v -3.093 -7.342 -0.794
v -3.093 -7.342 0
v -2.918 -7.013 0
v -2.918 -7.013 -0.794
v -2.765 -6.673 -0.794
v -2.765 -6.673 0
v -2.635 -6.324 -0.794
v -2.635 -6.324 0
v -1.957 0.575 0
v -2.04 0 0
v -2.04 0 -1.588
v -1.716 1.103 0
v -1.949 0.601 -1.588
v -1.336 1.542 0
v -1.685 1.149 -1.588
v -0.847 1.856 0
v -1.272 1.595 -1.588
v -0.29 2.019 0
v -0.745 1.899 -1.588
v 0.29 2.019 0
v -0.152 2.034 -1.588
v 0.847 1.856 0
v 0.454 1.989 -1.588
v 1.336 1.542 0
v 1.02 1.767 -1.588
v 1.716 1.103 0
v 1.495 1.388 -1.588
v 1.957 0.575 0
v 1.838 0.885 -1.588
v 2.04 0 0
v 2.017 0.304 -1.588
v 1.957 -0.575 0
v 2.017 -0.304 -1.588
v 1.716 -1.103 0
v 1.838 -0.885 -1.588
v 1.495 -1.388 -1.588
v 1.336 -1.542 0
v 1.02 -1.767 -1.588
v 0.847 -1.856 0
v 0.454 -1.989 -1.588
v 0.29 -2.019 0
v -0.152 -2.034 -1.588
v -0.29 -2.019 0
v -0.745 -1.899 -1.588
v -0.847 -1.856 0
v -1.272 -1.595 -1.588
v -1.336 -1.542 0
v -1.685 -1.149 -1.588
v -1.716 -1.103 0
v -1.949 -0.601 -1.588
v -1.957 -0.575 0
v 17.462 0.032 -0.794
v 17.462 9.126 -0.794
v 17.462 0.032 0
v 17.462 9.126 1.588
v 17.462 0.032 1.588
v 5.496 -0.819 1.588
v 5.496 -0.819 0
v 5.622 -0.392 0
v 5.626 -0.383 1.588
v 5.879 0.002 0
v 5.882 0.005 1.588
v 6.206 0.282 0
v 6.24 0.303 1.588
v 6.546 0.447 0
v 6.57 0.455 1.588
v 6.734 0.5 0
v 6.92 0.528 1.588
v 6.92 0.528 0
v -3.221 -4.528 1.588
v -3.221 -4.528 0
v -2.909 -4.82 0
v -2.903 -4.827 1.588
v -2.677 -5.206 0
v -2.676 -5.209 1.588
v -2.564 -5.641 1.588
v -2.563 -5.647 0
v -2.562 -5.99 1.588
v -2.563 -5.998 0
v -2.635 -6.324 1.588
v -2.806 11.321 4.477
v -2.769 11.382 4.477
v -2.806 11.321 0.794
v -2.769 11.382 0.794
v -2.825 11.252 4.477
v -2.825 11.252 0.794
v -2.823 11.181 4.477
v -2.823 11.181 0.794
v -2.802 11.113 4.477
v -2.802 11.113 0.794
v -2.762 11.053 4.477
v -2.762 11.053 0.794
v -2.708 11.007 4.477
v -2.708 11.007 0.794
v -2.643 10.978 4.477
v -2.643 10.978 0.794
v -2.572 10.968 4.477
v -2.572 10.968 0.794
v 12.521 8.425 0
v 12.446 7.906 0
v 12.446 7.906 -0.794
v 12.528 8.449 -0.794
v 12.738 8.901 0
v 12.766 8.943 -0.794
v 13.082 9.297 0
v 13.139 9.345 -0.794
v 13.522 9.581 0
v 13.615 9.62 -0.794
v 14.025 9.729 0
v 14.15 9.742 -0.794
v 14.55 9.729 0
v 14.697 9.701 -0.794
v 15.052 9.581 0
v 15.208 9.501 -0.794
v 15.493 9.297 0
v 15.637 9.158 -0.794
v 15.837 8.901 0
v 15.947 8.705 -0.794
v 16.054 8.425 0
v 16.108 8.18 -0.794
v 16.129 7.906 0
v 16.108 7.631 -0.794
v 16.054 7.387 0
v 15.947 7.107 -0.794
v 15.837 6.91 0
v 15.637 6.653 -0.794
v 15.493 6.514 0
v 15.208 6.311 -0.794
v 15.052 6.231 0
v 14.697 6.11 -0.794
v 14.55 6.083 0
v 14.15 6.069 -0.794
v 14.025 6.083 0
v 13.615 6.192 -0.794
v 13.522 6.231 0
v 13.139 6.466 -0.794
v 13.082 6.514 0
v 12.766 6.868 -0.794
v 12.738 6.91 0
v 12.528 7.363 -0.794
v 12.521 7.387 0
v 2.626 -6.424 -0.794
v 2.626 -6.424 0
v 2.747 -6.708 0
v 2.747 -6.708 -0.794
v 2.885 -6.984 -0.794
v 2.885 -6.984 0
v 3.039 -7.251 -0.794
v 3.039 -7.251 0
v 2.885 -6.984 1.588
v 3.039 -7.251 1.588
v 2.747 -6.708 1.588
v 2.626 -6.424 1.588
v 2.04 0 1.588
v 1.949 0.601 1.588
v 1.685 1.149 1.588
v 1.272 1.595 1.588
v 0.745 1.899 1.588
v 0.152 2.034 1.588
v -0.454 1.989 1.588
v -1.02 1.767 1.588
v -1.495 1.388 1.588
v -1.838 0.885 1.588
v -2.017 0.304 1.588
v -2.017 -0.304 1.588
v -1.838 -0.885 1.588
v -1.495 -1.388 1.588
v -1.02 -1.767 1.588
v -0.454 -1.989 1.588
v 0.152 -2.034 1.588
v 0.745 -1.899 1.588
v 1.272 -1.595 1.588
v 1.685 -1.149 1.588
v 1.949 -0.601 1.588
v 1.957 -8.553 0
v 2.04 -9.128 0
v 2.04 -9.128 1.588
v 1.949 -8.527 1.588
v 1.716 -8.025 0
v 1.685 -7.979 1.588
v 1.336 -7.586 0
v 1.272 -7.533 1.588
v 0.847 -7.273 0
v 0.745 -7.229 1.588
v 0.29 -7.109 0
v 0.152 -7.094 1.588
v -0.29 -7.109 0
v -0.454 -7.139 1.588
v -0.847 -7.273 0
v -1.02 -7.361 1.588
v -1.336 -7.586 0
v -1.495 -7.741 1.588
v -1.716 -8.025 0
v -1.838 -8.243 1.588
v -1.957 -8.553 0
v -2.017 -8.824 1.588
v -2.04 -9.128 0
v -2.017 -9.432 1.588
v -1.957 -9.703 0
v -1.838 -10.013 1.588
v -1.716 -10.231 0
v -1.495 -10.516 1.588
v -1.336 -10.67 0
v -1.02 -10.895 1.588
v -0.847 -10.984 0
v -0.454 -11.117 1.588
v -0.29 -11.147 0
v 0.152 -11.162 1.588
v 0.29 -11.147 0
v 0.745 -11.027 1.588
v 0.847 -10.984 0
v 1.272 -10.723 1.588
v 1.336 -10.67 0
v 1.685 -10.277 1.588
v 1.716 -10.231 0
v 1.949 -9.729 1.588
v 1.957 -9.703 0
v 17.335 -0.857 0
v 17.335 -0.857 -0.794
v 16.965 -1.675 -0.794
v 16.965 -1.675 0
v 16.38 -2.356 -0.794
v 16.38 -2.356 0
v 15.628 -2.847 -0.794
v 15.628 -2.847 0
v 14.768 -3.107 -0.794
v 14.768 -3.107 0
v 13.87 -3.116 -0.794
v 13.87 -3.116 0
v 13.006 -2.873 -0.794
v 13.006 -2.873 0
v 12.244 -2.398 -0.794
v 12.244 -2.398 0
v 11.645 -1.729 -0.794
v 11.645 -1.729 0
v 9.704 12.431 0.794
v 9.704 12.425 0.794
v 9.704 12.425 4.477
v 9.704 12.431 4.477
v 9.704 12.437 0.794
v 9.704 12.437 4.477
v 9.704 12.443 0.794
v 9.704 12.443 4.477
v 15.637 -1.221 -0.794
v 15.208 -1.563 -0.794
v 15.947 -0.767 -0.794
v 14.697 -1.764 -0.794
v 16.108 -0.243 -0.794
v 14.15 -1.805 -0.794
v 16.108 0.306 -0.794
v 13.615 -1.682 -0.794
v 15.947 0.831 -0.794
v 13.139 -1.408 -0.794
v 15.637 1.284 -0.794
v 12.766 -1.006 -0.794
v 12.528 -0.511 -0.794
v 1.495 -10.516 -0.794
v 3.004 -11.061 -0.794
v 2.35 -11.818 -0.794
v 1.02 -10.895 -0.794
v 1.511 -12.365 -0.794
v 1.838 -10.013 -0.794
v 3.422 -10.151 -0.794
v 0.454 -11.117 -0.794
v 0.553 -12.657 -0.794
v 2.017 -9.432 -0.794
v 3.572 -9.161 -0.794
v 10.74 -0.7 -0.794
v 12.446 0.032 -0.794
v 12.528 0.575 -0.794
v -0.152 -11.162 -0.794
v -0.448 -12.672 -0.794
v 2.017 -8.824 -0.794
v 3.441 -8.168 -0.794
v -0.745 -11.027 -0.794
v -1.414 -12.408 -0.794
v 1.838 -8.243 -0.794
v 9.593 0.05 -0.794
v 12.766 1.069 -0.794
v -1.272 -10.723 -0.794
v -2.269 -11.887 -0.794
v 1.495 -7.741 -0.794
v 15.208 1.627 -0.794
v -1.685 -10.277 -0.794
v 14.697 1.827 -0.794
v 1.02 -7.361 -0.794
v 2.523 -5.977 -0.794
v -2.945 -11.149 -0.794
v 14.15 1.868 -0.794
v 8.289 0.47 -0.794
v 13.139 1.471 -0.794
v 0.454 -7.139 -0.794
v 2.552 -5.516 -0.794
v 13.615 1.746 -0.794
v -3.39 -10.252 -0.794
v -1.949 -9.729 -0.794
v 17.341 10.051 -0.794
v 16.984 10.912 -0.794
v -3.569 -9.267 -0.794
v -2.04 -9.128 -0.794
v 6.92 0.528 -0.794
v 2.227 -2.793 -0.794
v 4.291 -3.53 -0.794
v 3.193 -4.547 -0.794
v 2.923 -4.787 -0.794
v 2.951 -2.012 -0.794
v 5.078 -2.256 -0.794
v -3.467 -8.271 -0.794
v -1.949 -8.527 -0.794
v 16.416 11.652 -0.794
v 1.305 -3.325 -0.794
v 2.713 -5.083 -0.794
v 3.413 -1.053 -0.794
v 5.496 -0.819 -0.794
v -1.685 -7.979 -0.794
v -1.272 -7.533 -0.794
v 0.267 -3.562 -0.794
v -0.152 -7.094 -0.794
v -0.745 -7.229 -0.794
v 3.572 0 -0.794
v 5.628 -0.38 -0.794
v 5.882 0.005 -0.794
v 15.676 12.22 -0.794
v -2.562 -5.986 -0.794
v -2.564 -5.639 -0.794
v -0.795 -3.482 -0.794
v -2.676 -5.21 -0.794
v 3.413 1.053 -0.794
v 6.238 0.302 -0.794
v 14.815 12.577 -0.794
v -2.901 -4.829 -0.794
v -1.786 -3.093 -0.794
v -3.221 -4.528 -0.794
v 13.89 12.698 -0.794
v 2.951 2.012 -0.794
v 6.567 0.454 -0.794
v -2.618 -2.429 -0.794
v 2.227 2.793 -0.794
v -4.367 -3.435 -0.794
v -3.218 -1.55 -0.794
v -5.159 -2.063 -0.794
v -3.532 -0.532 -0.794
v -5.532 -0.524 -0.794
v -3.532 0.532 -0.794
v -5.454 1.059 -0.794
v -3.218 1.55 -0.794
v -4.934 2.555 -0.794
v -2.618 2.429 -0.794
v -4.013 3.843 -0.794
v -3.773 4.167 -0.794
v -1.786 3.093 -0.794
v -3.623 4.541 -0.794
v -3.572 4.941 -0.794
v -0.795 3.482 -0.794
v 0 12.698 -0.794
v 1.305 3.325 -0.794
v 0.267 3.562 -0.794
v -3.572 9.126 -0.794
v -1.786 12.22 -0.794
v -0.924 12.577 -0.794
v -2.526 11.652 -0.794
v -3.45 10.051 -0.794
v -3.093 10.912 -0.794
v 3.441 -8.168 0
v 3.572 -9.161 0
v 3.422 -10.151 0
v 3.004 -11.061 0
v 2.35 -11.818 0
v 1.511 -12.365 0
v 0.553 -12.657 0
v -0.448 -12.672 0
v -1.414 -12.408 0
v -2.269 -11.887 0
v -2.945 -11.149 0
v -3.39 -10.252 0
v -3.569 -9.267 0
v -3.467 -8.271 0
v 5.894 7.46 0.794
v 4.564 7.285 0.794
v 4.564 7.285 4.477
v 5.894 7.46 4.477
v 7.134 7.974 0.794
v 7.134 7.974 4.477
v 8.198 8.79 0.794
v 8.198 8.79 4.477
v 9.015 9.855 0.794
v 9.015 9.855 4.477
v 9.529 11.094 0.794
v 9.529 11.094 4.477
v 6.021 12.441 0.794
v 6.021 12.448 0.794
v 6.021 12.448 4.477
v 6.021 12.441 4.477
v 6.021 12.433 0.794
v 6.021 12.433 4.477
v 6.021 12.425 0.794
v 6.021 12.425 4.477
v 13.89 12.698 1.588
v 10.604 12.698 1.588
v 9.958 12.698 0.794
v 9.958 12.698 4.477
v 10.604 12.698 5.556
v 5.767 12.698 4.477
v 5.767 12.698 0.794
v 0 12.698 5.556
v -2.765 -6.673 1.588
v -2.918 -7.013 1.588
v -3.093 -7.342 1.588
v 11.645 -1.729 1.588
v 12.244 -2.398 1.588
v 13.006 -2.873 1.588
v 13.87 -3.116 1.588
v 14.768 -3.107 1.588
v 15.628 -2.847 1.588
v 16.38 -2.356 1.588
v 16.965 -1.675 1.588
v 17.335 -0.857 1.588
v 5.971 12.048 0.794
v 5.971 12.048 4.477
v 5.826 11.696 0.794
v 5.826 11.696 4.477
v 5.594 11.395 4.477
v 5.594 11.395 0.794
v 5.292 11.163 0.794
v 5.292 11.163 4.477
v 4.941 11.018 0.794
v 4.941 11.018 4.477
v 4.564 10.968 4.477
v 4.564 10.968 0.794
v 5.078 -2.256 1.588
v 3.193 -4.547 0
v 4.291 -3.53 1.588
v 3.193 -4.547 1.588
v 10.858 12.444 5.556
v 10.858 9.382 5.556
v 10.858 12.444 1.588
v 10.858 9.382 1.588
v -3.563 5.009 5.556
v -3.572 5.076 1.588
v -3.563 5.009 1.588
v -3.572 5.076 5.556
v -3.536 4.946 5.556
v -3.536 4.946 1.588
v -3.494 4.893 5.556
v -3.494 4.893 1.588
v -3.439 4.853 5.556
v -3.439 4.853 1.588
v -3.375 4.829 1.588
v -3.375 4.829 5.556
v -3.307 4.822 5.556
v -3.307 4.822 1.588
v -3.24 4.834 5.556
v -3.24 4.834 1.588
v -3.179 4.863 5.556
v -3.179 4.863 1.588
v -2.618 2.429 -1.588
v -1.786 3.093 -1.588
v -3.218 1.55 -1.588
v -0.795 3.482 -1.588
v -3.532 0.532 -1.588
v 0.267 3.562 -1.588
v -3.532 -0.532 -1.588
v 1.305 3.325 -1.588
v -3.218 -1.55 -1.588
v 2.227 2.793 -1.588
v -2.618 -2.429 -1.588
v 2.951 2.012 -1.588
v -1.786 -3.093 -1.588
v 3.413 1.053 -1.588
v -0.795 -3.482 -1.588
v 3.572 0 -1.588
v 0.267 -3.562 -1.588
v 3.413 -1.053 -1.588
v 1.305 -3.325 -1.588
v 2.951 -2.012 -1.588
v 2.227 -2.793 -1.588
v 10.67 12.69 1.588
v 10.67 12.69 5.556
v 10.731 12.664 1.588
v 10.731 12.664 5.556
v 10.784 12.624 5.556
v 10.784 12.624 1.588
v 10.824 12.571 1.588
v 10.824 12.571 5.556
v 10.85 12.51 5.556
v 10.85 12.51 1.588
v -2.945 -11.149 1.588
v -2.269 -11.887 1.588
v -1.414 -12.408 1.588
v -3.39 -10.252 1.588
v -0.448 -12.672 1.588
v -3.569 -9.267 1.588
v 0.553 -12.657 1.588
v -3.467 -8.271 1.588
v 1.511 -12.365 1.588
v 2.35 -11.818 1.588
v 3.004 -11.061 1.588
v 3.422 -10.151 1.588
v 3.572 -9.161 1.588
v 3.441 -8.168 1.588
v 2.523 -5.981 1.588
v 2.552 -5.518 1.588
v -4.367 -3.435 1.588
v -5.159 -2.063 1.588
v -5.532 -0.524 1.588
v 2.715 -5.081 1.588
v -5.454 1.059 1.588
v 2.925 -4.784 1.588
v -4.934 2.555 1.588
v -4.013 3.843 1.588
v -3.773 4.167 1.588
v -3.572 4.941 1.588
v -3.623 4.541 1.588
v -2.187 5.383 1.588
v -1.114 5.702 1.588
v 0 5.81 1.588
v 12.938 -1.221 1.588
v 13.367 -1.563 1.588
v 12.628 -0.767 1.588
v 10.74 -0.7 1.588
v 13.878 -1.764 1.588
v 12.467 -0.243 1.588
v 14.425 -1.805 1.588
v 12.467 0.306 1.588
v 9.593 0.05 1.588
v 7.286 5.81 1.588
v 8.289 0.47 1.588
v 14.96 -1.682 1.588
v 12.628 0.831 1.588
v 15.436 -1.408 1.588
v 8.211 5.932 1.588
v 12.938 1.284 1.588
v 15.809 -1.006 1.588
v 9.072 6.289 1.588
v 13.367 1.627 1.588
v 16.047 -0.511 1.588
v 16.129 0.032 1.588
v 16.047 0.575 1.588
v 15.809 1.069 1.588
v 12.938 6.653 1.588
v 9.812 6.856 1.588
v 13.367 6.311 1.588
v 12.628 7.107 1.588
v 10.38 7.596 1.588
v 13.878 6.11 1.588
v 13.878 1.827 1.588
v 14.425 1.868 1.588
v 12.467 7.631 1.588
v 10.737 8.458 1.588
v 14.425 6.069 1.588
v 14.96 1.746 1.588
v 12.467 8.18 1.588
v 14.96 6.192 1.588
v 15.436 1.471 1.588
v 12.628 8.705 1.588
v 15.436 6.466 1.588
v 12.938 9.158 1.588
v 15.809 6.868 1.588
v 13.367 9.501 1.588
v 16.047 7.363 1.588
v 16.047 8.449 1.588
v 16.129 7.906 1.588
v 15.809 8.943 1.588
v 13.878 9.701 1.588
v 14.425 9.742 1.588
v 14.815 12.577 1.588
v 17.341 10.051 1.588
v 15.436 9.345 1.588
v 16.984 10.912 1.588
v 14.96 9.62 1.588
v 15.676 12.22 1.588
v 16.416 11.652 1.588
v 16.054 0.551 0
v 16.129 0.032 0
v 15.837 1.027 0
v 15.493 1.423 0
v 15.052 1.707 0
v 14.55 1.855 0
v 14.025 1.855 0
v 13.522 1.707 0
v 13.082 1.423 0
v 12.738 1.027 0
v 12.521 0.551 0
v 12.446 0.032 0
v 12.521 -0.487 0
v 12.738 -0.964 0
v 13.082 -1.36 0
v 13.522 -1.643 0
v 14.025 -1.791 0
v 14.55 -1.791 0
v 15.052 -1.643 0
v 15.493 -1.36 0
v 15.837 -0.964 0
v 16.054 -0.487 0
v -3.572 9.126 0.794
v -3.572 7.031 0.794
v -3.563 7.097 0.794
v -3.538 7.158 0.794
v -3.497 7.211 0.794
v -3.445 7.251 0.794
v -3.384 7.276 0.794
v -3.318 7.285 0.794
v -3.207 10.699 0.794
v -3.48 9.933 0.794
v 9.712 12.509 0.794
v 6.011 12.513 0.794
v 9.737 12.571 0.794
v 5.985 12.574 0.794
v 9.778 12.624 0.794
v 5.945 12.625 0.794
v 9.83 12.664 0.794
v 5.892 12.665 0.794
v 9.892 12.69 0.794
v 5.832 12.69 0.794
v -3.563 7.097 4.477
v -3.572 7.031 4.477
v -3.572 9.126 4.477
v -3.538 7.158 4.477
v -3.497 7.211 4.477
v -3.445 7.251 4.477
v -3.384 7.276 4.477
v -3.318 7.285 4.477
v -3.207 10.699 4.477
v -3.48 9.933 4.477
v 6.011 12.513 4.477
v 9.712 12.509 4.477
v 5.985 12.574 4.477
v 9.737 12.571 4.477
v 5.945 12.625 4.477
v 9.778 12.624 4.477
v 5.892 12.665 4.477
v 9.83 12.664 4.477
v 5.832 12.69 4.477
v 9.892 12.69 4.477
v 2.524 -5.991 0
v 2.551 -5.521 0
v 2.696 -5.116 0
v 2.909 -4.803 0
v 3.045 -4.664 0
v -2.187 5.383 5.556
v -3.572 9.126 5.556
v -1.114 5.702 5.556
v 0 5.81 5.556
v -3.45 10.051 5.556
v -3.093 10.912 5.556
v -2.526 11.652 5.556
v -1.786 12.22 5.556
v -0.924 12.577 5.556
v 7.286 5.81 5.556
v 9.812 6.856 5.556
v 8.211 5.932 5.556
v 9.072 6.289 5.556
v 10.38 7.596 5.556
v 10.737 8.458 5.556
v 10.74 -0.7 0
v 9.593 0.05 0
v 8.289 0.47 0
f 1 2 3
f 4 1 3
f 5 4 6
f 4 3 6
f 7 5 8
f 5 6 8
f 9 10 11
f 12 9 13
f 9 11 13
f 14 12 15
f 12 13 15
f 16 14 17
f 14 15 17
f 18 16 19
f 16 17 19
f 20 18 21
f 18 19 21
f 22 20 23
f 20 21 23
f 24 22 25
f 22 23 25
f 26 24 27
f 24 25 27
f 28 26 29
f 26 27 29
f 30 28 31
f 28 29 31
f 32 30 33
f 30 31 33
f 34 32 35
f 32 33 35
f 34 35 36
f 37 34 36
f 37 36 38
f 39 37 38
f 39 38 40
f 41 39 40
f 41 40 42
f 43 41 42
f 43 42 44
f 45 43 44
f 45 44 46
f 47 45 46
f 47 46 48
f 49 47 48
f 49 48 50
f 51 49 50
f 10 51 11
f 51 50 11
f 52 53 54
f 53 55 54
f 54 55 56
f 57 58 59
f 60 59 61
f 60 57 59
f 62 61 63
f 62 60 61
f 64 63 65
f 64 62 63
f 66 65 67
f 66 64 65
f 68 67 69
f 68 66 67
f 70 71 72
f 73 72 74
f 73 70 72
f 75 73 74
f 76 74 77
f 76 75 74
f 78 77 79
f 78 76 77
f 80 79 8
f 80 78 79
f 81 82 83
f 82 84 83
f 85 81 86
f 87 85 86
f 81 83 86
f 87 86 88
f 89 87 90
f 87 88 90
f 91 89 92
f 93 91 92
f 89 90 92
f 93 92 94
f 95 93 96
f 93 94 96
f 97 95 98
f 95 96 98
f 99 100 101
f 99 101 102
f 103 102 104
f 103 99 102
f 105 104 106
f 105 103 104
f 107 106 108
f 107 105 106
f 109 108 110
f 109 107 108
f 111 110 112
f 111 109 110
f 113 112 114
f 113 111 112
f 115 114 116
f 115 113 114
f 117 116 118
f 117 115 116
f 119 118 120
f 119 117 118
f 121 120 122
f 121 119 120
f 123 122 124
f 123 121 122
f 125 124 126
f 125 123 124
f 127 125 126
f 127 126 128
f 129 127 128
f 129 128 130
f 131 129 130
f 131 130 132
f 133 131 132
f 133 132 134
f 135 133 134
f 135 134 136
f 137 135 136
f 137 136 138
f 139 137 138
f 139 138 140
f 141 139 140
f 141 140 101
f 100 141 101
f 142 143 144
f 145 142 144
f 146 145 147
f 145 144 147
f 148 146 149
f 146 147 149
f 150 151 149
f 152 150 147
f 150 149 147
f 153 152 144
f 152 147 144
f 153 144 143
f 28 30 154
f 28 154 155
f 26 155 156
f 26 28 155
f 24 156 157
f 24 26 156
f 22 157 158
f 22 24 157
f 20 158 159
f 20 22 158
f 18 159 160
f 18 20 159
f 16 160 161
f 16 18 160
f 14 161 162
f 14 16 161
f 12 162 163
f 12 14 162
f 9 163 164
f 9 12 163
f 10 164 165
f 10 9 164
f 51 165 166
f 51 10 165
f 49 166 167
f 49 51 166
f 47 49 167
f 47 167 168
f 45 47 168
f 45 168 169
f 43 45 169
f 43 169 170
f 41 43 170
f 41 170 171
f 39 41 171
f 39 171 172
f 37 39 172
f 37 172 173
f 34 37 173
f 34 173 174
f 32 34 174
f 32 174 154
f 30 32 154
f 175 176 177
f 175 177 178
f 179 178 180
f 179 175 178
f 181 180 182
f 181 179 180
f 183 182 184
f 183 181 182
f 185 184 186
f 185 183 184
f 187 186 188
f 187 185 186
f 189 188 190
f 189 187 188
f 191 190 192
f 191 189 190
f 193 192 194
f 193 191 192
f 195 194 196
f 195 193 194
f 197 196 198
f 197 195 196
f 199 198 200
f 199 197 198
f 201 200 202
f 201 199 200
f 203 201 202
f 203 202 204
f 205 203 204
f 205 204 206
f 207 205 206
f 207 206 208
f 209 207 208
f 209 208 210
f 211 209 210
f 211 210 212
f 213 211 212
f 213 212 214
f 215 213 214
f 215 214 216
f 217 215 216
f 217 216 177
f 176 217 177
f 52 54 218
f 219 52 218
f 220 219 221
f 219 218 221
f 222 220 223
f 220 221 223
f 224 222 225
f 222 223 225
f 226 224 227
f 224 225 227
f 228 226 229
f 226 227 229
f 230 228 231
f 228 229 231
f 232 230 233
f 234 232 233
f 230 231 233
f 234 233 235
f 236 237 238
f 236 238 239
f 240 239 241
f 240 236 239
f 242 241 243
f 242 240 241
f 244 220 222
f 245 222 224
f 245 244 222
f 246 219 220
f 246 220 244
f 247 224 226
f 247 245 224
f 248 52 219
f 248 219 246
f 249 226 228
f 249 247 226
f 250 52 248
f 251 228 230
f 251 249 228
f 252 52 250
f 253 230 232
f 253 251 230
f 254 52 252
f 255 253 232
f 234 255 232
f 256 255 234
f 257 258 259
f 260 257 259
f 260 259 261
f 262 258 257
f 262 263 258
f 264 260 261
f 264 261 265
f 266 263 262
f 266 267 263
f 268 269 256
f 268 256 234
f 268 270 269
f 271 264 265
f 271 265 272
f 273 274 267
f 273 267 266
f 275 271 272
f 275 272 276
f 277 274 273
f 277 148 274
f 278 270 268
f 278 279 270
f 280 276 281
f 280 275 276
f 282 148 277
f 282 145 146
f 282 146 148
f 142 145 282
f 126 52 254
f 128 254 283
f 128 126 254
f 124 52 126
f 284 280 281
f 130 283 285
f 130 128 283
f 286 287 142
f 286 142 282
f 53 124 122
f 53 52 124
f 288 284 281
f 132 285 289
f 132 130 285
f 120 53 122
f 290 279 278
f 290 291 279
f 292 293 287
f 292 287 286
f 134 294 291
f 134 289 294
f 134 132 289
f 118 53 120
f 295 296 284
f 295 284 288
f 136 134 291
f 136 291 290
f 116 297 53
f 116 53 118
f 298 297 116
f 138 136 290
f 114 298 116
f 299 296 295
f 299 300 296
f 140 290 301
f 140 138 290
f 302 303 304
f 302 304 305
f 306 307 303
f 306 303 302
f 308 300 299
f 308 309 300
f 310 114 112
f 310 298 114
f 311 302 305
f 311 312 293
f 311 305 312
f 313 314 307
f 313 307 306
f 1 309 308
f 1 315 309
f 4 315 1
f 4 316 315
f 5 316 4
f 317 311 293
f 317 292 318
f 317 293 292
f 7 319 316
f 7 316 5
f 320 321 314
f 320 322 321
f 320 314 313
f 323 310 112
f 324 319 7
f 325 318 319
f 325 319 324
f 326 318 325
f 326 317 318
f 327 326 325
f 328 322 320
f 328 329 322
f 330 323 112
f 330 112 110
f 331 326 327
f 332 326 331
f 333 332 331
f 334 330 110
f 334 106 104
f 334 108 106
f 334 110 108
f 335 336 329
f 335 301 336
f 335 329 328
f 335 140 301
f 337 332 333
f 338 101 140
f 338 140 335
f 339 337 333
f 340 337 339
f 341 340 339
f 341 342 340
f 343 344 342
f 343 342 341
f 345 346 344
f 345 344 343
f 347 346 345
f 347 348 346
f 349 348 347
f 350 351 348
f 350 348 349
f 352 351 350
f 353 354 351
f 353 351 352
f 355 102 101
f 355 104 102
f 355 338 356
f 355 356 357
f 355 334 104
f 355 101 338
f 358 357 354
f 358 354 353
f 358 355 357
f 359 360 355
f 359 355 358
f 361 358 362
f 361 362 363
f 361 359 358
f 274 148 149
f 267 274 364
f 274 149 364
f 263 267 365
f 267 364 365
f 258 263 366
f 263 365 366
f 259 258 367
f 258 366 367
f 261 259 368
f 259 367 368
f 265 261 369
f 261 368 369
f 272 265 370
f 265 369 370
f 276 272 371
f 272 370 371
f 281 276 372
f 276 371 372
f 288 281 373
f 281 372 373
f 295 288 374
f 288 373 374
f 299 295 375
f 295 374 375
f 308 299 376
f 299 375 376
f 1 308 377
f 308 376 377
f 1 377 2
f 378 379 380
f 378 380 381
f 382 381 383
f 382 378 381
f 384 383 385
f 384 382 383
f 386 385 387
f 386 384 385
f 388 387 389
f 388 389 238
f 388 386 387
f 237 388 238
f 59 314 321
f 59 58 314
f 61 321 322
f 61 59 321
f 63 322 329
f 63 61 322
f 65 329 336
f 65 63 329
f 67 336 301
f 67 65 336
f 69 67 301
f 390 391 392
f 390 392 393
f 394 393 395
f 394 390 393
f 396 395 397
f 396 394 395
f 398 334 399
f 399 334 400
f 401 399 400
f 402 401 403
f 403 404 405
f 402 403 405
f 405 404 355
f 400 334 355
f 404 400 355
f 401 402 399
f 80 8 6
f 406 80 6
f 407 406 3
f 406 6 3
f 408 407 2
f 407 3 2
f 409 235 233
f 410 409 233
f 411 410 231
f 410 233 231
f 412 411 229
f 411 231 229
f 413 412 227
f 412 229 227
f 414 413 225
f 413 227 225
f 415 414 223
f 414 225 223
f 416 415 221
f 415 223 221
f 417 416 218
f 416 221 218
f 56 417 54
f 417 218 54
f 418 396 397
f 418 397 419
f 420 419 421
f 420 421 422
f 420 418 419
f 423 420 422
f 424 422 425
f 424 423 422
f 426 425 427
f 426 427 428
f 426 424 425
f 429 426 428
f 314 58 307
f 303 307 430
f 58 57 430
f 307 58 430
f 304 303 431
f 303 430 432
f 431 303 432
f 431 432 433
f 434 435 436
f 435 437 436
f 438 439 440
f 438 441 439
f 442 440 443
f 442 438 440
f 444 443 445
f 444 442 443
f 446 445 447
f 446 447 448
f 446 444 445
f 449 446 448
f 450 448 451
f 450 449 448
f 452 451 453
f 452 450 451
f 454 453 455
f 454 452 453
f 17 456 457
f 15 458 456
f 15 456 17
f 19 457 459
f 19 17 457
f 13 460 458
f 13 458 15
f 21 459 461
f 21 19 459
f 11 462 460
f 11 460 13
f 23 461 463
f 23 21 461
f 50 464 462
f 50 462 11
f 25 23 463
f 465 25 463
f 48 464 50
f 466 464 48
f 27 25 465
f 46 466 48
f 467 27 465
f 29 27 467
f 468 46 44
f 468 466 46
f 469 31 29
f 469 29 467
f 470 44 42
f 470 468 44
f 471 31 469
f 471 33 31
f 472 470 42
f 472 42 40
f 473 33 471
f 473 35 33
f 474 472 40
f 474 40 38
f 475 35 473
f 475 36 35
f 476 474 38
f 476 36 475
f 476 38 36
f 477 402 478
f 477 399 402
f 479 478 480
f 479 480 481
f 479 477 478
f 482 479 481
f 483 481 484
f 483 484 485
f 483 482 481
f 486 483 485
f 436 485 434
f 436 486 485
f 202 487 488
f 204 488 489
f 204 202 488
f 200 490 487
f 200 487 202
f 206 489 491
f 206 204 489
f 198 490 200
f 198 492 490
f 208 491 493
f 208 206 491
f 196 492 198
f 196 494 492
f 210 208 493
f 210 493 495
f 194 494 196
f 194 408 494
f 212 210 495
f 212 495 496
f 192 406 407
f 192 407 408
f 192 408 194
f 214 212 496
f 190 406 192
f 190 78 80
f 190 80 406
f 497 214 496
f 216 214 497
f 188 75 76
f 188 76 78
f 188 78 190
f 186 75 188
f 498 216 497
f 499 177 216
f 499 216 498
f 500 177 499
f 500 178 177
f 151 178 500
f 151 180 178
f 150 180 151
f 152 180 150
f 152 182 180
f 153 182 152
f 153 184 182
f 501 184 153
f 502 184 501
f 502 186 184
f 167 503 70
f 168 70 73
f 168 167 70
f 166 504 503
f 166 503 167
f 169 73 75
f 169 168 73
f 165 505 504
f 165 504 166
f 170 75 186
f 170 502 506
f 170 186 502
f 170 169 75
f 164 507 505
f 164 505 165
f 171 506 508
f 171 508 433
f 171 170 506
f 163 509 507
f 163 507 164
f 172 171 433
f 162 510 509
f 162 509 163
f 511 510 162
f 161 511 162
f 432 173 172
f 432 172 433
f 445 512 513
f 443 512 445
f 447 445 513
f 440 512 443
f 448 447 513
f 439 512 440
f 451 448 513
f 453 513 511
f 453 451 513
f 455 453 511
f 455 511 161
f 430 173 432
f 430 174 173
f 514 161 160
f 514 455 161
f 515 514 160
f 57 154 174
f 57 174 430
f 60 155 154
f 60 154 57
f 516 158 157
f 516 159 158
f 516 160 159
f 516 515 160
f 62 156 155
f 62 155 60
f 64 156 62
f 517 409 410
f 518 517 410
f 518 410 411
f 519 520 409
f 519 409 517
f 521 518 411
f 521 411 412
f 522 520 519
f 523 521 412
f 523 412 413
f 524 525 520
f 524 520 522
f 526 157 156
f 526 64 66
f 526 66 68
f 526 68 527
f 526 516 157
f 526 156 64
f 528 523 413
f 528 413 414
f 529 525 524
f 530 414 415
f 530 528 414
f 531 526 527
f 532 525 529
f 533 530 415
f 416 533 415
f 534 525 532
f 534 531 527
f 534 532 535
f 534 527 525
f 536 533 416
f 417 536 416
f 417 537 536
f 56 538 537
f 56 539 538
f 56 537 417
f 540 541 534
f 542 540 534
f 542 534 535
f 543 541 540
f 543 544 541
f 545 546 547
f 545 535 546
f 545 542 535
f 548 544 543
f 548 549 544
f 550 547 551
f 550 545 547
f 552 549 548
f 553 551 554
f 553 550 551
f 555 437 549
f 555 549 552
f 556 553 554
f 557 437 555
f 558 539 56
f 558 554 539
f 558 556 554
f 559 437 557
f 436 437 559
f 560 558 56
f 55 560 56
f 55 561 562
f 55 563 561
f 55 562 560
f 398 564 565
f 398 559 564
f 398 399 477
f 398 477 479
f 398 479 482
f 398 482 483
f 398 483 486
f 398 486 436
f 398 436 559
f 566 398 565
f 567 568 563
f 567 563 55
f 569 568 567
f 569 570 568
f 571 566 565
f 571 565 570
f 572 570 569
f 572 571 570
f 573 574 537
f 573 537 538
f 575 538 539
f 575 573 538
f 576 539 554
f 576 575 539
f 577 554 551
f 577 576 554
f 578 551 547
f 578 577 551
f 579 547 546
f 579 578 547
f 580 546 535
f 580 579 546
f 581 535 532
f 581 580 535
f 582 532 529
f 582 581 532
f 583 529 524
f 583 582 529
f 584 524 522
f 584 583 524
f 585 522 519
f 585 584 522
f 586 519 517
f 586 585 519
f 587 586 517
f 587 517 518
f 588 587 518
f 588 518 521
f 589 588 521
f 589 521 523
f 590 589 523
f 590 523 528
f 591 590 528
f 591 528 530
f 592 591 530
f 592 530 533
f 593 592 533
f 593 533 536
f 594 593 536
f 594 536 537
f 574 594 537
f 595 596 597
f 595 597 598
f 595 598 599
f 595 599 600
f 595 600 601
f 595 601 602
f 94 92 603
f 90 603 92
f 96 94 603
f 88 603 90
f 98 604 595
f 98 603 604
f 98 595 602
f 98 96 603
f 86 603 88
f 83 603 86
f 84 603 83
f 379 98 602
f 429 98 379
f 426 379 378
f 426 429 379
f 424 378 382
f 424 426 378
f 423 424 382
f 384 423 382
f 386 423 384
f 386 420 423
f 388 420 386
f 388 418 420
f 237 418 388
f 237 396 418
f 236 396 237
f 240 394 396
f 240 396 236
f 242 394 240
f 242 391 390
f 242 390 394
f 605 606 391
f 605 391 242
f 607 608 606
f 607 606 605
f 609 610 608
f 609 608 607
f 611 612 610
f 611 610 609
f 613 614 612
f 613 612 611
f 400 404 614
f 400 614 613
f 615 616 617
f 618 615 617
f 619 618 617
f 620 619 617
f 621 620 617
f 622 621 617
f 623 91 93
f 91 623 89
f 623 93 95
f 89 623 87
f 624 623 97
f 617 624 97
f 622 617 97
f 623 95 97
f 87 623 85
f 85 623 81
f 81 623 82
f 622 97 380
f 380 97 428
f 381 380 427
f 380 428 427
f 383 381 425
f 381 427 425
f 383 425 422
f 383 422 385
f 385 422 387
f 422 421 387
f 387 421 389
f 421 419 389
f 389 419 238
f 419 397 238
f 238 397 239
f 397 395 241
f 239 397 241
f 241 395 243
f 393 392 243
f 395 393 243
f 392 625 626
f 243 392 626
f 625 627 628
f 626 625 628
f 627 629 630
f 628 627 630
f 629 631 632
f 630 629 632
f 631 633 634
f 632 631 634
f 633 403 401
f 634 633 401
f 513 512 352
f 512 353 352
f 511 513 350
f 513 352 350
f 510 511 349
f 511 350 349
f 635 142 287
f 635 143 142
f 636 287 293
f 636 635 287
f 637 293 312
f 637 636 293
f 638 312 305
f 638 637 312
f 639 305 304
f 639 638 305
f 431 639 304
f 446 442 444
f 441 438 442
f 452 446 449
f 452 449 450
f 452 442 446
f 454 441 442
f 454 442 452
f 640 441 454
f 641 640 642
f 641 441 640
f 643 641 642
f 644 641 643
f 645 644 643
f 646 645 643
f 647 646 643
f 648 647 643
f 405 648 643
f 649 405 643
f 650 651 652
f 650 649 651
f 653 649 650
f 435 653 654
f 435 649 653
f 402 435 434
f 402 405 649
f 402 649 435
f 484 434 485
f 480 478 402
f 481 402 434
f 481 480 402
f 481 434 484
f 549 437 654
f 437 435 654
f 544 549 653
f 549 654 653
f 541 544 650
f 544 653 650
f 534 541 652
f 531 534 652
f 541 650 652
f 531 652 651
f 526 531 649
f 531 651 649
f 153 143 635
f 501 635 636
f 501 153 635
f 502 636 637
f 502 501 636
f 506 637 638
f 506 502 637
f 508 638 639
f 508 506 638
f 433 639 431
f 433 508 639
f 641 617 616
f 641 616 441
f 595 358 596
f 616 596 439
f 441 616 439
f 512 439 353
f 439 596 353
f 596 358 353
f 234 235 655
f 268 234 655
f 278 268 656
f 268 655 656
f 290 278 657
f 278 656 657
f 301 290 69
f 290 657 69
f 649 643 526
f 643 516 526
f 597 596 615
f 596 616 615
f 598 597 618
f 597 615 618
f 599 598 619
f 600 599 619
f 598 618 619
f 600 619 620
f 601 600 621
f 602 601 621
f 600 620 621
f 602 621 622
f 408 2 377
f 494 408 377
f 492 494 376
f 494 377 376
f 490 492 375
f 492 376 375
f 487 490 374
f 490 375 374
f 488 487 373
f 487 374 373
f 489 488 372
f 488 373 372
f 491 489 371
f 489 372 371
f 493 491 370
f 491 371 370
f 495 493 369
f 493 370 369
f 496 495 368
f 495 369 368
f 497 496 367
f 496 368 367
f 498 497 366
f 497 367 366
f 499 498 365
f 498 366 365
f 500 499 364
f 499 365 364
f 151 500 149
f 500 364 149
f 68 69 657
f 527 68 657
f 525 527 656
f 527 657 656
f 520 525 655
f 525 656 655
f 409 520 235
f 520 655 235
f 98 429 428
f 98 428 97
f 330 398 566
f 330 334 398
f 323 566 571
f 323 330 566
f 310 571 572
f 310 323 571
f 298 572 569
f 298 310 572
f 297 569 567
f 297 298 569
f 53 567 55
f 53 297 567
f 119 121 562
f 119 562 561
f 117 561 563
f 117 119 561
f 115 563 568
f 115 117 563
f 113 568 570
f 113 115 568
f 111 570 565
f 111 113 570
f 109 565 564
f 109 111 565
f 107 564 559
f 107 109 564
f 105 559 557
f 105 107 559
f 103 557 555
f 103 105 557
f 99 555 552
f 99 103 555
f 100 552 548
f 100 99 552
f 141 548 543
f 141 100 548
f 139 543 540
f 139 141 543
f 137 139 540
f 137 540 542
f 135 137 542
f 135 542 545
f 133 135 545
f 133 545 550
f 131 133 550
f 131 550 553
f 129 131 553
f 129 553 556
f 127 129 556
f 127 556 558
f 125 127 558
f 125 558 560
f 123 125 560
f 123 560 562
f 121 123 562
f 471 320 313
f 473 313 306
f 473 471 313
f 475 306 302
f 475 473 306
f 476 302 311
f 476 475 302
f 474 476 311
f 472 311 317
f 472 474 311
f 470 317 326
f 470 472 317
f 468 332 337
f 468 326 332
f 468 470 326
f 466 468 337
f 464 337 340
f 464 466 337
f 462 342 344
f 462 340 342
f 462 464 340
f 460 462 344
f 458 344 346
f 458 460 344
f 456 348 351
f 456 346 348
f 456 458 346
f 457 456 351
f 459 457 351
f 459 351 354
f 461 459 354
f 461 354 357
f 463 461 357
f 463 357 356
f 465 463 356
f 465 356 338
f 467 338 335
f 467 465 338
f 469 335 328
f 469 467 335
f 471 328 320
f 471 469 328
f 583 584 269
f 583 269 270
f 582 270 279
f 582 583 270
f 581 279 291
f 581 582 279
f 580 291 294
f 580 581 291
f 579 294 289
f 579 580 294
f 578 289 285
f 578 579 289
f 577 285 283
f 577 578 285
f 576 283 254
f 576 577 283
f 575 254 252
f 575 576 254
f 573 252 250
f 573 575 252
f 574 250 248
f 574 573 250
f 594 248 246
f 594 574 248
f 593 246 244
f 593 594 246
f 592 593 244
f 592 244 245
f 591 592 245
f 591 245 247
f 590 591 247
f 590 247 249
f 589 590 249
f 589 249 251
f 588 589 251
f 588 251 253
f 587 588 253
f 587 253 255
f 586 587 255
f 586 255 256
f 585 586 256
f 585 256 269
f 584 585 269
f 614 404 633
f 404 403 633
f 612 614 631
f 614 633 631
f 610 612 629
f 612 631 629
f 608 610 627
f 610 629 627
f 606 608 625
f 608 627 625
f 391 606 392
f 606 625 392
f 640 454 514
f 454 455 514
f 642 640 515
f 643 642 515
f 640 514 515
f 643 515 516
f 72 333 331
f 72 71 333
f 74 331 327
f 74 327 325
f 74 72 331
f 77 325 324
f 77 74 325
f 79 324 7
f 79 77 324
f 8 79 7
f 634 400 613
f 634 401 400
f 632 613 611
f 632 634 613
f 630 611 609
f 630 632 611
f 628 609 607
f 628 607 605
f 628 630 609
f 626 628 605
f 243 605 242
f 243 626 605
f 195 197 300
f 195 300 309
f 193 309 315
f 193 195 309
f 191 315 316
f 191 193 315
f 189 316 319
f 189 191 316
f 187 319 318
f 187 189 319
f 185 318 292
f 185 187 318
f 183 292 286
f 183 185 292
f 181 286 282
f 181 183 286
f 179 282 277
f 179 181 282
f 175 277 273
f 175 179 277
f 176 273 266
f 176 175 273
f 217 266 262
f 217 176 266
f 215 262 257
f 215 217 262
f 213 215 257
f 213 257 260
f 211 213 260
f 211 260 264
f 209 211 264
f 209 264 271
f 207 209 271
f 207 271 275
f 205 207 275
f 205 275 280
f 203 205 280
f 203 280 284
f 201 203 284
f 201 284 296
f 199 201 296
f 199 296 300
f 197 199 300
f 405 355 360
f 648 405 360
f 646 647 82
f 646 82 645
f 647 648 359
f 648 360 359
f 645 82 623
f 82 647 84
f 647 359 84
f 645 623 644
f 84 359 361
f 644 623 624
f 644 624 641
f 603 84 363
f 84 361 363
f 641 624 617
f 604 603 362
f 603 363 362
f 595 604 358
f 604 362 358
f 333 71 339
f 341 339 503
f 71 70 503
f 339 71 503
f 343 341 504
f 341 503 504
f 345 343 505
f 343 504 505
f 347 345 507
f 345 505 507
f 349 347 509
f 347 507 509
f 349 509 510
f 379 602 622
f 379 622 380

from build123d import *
from build123d.topology import SkipClean

# Parameters (mm, degrees)
SKETCH2_R                 = 2.0399375
SKETCH2_R_2               = 1.8415
BOSS_EXTRUDE1_DEPTH       = 4.7625
CUT_EXTRUDE1_START        = -3.175
SKETCH5_R                 = 2.0399375
SKETCH5_R_2               = 1.8415
CUT_EXTRUDE1_DEPTH        = 3.175
CUT_EXTRUDE2_START        = 0.79375
CUT_EXTRUDE2_DEPTH        = 3.683
BOSS_EXTRUDE2_START       = 1.5875
SKETCH6_R                 = 3.571875
SKETCH6_R_2               = 2.0399375
BOSS_EXTRUDE2_DEPTH       = 1.5875
BOSS_EXTRUDE3_OUTLINE_R   = 2.0399375
BOSS_EXTRUDE3_OUTLINE_R_2 = 1.8415
BOSS_EXTRUDE3_OUTLINE_R_3 = 3.571875
BOSS_EXTRUDE3_DEPTH       = 0.79375
BOSS_EXTRUDE4_DEPTH       = 0.79375
FILLET1_R                 = 3.572002
FILLET2_R                 = 0.254
FILLET3_R                 = 1.5875


# Read off the part's stored shape, not the designer's step: Boss-Extrude3
with BuildPart() as part:
    # Sketch2 → Boss-Extrude1 (new body)
    with BuildSketch(Plane.XY):
        with BuildLine():
            Line((17.462464722, 12.698349), (0, 12.698349))
            ThreePointArc((0, 12.698349), (-2.525697034, 11.652171034), (-3.571875, 9.126474))
            Line((-3.571875, 9.126474), (-3.571875, 4.256010226))
            ThreePointArc((-3.571875, 4.256010226), (-5.510115516, -0.714521565), (-2.368197689, -5.02628628))
            ThreePointArc((-2.368197689, -5.02628628), (-2.602783662, -6.224309717), (-3.093334465, -7.342187459))
            ThreePointArc((-3.093334465, -7.342187459), (0.053006227, -12.699606675), (3.038971631, -7.251174697))
            ThreePointArc((3.038971631, -7.251174697), (2.543740299, -6.196888698), (2.299944817, -5.05788176))
            ThreePointArc((2.299944817, -5.05788176), (4.727286579, -2.919704723), (5.552352254, 0.208082946))
            ThreePointArc((5.552352254, 0.208082946), (8.938780729, 0.309264009), (11.645223776, -1.728701017))
            ThreePointArc((11.645223776, -1.728701017), (15.207114111, -3.007142891), (17.462464722, 0.03175))
            Line((17.462464722, 0.03175), (17.462464722, 12.698349))
        make_face()
        with Locations((0, -9.128125)):
            Circle(SKETCH2_R, mode=Mode.SUBTRACT)
        Circle(SKETCH2_R, mode=Mode.SUBTRACT)
        with Locations((14.287464722, 0.03175)):
            Circle(SKETCH2_R_2, mode=Mode.SUBTRACT)
        with Locations((14.287464722, 7.90575)):
            Circle(SKETCH2_R_2, mode=Mode.SUBTRACT)
    extrude(amount=BOSS_EXTRUDE1_DEPTH)

    # Sketch5 → Cut-Extrude1 (cut)
    with BuildSketch(Plane.XY.offset(4.7625).offset(CUT_EXTRUDE1_START)):
        with BuildLine():
            Line((10.858464722, 12.698349), (10.858464722, 11.08075))
            Line((10.858464722, 11.08075), (10.858464722, 5.81025))
            Line((10.858464722, 5.81025), (0, 5.81025))
            ThreePointArc((0, 5.81025), (-1.88847054, 5.494786991), (-3.571875, 4.582653603))
            Line((-3.571875, 4.582653603), (-3.571875, 4.256010226))
            ThreePointArc((-3.571875, 4.256010226), (-5.510115516, -0.714521565), (-2.368197689, -5.02628628))
            ThreePointArc((-2.368197689, -5.02628628), (-2.602783664, -6.224309725), (-3.093334473, -7.342187472))
            ThreePointArc((-3.093334473, -7.342187472), (0.053006235, -12.699606675), (3.038971631, -7.251174697))
            ThreePointArc((3.038971631, -7.251174697), (2.543740299, -6.196888698), (2.299944817, -5.05788176))
            ThreePointArc((2.299944817, -5.05788176), (4.727286579, -2.919704723), (5.552352254, 0.208082946))
            ThreePointArc((5.552352254, 0.208082946), (8.938780739, 0.309264006), (11.645223789, -1.728701036))
            ThreePointArc((11.645223801, -1.728701054), (15.207114132, -3.007142884), (17.462464722, 0.03175))
            Line((17.462464722, 0.03175), (17.462464722, 12.698349))
            Line((17.462464722, 12.698349), (10.858464722, 12.698349))
        make_face()
        with Locations((0, -9.128125)):
            Circle(SKETCH5_R, mode=Mode.SUBTRACT)
        Circle(SKETCH5_R, mode=Mode.SUBTRACT)
        with Locations((14.287464722, 0.03175)):
            Circle(SKETCH5_R_2, mode=Mode.SUBTRACT)
        with Locations((14.287464722, 7.90575)):
            Circle(SKETCH5_R_2, mode=Mode.SUBTRACT)
    extrude(amount=CUT_EXTRUDE1_DEPTH, mode=Mode.SUBTRACT)

    # Sketch3 → Cut-Extrude2 (cut)
    with BuildSketch(Plane.XY.offset(CUT_EXTRUDE2_START)):
        with BuildLine():
            Line((-0.364938051, 10.967974), (-3.571875, 10.967974))
            Line((-3.571875, 10.967974), (-3.571875, 7.284974))
            Line((-3.571875, 7.284974), (4.564044861, 7.284974))
            ThreePointArc((4.564044861, 7.284974), (1.487546789, 8.307421556), (-0.364938051, 10.967974))
        make_face()
        with BuildLine():
            Line((4.564044861, 10.967974), (-0.364938051, 10.967974))
            ThreePointArc((-0.364938051, 10.967974), (1.487546789, 8.307421556), (4.564044861, 7.284974))
            Line((4.564044861, 7.284974), (4.564044861, 10.967974))
        make_face()
        with BuildLine():
            ThreePointArc((6.020789845, 12.424718984), (5.594119118, 11.394644727), (4.564044861, 10.967974))
            Line((4.564044861, 10.967974), (4.564044861, 7.284974))
            ThreePointArc((4.564044861, 7.284974), (8.198393393, 8.790370452), (9.703789845, 12.424718984))
            ThreePointArc((9.703789845, 12.424718984), (9.701967288, 12.561582524), (9.696500912, 12.698349))
            Line((9.696500912, 12.698349), (5.99486021, 12.698349))
            ThreePointArc((5.99486021, 12.698349), (6.014292948, 12.562146903), (6.020789845, 12.424718984))
        make_face()
    extrude(amount=CUT_EXTRUDE2_DEPTH, mode=Mode.SUBTRACT)

    # Sketch6 → Boss-Extrude2 (add)
    with SkipClean():  # the faces are left unmerged after this step: merging them gives an invalid solid
        with BuildSketch(Plane(origin=(0, 0, 0), x_dir=(-1, 0, 0), z_dir=(0, 0, -1)).offset(BOSS_EXTRUDE2_START)):
            with Locations(Location((0, 0, 0), (0, 0, 180))):
                Circle(SKETCH6_R)
            Circle(SKETCH6_R_2, mode=Mode.SUBTRACT)
        extrude(amount=-BOSS_EXTRUDE2_DEPTH)

    # Boss-Extrude3 outline → Boss-Extrude3 (add)
    with BuildSketch(Plane(origin=(0, 0, 0), x_dir=(-1, 0, 0), z_dir=(0, 0, -1))):
        with BuildLine():
            ThreePointArc((3.093334489, -7.3421875), (2.602783669, -6.22430974), (2.368197689, -5.02628628))
            ThreePointArc((2.368197689, -5.02628628), (5.510115516, -0.714521565), (3.571875, 4.256010226))
            Line((3.571875, 4.256010226), (3.571875, 9.126474))
            ThreePointArc((3.571875, 9.126474), (2.525697034, 11.652171034), (0, 12.698349))
            Line((0, 12.698349), (-17.462464722, 12.698349))
            Line((-17.462464722, 12.698349), (-17.462464722, 0.03175))
            ThreePointArc((-17.462464722, 0.03175), (-15.207114132, -3.007142884), (-11.645223801, -1.728701054))
            ThreePointArc((-11.645223801, -1.728701054), (-8.93878075, 0.309264003), (-5.552352254, 0.208082946))
            ThreePointArc((-5.552352254, 0.208082946), (-4.727286579, -2.919704723), (-2.299944817, -5.05788176))
            ThreePointArc((-2.299944817, -5.05788176), (-2.543739786, -6.196887176), (-3.038969943, -7.251171964))
            ThreePointArc((-3.038969943, -7.251171964), (-0.053007857, -12.699606651), (3.093334489, -7.3421875))
        make_face()
        with Locations((0, -9.128125)):
            Circle(BOSS_EXTRUDE3_OUTLINE_R, mode=Mode.SUBTRACT)
        with Locations((-14.287464722, 0.03175)):
            Circle(BOSS_EXTRUDE3_OUTLINE_R_2, mode=Mode.SUBTRACT)
        with Locations((-14.287464722, 7.90575)):
            Circle(BOSS_EXTRUDE3_OUTLINE_R_2, mode=Mode.SUBTRACT)
        Circle(BOSS_EXTRUDE3_OUTLINE_R_3, mode=Mode.SUBTRACT)
    extrude(amount=BOSS_EXTRUDE3_DEPTH)

    # Sketch8 → Boss-Extrude4 (add)
    with BuildSketch(Plane.XY.offset(4.7625)):
        with BuildLine():
            Line((-3.571875, 9.126474), (-3.571875, 4.582653603))
            ThreePointArc((-3.571875, 4.582653603), (-1.88847054, 5.494786991), (0, 5.81025))
            Line((0, 5.81025), (10.858464722, 5.81025))
            Line((10.858464722, 5.81025), (10.858464722, 12.698349))
            Line((10.858464722, 12.698349), (0, 12.698349))
            ThreePointArc((0, 12.698349), (-2.525697034, 11.652171034), (-3.571875, 9.126474))
        make_face()
    extrude(amount=BOSS_EXTRUDE4_DEPTH)

    # Fillet1
    fillet1_edges = [part.edges().sort_by_distance(p)[0] for p in [
        (17.462464722, 12.698349, 0.79375),
        (10.858464722, 5.81025, 3.571875),
    ]]
    fillet(fillet1_edges, radius=FILLET1_R)

    # Fillet2
    fillet2_edges = [part.edges().sort_by_distance(p)[0] for p in [
        (-3.060583076, 10.967974, 2.63525),
        (-3.571875, 7.284974, 2.63525),
        (9.696500912, 12.698349, 2.63525),
        (5.99486021, 12.698349, 2.63525),
        (10.858464722, 12.698349, 3.571875),
        (-3.571875, 4.582653603, 3.571875),
    ]]
    fillet(fillet2_edges, radius=FILLET2_R)

    # Fillet3
    fillet3_edges = [part.edges().sort_by_distance(p)[0] for p in [
        (5.552352254, 0.208082946, 0.79375),
        (2.299944817, -5.05788176, 0.79375),
        (-2.368197689, -5.02628628, 0.79375),
        (-3.571875, 4.256010226, 0.79375),
    ]]
    fillet(fillet3_edges, radius=FILLET3_R)


solid = part.part
